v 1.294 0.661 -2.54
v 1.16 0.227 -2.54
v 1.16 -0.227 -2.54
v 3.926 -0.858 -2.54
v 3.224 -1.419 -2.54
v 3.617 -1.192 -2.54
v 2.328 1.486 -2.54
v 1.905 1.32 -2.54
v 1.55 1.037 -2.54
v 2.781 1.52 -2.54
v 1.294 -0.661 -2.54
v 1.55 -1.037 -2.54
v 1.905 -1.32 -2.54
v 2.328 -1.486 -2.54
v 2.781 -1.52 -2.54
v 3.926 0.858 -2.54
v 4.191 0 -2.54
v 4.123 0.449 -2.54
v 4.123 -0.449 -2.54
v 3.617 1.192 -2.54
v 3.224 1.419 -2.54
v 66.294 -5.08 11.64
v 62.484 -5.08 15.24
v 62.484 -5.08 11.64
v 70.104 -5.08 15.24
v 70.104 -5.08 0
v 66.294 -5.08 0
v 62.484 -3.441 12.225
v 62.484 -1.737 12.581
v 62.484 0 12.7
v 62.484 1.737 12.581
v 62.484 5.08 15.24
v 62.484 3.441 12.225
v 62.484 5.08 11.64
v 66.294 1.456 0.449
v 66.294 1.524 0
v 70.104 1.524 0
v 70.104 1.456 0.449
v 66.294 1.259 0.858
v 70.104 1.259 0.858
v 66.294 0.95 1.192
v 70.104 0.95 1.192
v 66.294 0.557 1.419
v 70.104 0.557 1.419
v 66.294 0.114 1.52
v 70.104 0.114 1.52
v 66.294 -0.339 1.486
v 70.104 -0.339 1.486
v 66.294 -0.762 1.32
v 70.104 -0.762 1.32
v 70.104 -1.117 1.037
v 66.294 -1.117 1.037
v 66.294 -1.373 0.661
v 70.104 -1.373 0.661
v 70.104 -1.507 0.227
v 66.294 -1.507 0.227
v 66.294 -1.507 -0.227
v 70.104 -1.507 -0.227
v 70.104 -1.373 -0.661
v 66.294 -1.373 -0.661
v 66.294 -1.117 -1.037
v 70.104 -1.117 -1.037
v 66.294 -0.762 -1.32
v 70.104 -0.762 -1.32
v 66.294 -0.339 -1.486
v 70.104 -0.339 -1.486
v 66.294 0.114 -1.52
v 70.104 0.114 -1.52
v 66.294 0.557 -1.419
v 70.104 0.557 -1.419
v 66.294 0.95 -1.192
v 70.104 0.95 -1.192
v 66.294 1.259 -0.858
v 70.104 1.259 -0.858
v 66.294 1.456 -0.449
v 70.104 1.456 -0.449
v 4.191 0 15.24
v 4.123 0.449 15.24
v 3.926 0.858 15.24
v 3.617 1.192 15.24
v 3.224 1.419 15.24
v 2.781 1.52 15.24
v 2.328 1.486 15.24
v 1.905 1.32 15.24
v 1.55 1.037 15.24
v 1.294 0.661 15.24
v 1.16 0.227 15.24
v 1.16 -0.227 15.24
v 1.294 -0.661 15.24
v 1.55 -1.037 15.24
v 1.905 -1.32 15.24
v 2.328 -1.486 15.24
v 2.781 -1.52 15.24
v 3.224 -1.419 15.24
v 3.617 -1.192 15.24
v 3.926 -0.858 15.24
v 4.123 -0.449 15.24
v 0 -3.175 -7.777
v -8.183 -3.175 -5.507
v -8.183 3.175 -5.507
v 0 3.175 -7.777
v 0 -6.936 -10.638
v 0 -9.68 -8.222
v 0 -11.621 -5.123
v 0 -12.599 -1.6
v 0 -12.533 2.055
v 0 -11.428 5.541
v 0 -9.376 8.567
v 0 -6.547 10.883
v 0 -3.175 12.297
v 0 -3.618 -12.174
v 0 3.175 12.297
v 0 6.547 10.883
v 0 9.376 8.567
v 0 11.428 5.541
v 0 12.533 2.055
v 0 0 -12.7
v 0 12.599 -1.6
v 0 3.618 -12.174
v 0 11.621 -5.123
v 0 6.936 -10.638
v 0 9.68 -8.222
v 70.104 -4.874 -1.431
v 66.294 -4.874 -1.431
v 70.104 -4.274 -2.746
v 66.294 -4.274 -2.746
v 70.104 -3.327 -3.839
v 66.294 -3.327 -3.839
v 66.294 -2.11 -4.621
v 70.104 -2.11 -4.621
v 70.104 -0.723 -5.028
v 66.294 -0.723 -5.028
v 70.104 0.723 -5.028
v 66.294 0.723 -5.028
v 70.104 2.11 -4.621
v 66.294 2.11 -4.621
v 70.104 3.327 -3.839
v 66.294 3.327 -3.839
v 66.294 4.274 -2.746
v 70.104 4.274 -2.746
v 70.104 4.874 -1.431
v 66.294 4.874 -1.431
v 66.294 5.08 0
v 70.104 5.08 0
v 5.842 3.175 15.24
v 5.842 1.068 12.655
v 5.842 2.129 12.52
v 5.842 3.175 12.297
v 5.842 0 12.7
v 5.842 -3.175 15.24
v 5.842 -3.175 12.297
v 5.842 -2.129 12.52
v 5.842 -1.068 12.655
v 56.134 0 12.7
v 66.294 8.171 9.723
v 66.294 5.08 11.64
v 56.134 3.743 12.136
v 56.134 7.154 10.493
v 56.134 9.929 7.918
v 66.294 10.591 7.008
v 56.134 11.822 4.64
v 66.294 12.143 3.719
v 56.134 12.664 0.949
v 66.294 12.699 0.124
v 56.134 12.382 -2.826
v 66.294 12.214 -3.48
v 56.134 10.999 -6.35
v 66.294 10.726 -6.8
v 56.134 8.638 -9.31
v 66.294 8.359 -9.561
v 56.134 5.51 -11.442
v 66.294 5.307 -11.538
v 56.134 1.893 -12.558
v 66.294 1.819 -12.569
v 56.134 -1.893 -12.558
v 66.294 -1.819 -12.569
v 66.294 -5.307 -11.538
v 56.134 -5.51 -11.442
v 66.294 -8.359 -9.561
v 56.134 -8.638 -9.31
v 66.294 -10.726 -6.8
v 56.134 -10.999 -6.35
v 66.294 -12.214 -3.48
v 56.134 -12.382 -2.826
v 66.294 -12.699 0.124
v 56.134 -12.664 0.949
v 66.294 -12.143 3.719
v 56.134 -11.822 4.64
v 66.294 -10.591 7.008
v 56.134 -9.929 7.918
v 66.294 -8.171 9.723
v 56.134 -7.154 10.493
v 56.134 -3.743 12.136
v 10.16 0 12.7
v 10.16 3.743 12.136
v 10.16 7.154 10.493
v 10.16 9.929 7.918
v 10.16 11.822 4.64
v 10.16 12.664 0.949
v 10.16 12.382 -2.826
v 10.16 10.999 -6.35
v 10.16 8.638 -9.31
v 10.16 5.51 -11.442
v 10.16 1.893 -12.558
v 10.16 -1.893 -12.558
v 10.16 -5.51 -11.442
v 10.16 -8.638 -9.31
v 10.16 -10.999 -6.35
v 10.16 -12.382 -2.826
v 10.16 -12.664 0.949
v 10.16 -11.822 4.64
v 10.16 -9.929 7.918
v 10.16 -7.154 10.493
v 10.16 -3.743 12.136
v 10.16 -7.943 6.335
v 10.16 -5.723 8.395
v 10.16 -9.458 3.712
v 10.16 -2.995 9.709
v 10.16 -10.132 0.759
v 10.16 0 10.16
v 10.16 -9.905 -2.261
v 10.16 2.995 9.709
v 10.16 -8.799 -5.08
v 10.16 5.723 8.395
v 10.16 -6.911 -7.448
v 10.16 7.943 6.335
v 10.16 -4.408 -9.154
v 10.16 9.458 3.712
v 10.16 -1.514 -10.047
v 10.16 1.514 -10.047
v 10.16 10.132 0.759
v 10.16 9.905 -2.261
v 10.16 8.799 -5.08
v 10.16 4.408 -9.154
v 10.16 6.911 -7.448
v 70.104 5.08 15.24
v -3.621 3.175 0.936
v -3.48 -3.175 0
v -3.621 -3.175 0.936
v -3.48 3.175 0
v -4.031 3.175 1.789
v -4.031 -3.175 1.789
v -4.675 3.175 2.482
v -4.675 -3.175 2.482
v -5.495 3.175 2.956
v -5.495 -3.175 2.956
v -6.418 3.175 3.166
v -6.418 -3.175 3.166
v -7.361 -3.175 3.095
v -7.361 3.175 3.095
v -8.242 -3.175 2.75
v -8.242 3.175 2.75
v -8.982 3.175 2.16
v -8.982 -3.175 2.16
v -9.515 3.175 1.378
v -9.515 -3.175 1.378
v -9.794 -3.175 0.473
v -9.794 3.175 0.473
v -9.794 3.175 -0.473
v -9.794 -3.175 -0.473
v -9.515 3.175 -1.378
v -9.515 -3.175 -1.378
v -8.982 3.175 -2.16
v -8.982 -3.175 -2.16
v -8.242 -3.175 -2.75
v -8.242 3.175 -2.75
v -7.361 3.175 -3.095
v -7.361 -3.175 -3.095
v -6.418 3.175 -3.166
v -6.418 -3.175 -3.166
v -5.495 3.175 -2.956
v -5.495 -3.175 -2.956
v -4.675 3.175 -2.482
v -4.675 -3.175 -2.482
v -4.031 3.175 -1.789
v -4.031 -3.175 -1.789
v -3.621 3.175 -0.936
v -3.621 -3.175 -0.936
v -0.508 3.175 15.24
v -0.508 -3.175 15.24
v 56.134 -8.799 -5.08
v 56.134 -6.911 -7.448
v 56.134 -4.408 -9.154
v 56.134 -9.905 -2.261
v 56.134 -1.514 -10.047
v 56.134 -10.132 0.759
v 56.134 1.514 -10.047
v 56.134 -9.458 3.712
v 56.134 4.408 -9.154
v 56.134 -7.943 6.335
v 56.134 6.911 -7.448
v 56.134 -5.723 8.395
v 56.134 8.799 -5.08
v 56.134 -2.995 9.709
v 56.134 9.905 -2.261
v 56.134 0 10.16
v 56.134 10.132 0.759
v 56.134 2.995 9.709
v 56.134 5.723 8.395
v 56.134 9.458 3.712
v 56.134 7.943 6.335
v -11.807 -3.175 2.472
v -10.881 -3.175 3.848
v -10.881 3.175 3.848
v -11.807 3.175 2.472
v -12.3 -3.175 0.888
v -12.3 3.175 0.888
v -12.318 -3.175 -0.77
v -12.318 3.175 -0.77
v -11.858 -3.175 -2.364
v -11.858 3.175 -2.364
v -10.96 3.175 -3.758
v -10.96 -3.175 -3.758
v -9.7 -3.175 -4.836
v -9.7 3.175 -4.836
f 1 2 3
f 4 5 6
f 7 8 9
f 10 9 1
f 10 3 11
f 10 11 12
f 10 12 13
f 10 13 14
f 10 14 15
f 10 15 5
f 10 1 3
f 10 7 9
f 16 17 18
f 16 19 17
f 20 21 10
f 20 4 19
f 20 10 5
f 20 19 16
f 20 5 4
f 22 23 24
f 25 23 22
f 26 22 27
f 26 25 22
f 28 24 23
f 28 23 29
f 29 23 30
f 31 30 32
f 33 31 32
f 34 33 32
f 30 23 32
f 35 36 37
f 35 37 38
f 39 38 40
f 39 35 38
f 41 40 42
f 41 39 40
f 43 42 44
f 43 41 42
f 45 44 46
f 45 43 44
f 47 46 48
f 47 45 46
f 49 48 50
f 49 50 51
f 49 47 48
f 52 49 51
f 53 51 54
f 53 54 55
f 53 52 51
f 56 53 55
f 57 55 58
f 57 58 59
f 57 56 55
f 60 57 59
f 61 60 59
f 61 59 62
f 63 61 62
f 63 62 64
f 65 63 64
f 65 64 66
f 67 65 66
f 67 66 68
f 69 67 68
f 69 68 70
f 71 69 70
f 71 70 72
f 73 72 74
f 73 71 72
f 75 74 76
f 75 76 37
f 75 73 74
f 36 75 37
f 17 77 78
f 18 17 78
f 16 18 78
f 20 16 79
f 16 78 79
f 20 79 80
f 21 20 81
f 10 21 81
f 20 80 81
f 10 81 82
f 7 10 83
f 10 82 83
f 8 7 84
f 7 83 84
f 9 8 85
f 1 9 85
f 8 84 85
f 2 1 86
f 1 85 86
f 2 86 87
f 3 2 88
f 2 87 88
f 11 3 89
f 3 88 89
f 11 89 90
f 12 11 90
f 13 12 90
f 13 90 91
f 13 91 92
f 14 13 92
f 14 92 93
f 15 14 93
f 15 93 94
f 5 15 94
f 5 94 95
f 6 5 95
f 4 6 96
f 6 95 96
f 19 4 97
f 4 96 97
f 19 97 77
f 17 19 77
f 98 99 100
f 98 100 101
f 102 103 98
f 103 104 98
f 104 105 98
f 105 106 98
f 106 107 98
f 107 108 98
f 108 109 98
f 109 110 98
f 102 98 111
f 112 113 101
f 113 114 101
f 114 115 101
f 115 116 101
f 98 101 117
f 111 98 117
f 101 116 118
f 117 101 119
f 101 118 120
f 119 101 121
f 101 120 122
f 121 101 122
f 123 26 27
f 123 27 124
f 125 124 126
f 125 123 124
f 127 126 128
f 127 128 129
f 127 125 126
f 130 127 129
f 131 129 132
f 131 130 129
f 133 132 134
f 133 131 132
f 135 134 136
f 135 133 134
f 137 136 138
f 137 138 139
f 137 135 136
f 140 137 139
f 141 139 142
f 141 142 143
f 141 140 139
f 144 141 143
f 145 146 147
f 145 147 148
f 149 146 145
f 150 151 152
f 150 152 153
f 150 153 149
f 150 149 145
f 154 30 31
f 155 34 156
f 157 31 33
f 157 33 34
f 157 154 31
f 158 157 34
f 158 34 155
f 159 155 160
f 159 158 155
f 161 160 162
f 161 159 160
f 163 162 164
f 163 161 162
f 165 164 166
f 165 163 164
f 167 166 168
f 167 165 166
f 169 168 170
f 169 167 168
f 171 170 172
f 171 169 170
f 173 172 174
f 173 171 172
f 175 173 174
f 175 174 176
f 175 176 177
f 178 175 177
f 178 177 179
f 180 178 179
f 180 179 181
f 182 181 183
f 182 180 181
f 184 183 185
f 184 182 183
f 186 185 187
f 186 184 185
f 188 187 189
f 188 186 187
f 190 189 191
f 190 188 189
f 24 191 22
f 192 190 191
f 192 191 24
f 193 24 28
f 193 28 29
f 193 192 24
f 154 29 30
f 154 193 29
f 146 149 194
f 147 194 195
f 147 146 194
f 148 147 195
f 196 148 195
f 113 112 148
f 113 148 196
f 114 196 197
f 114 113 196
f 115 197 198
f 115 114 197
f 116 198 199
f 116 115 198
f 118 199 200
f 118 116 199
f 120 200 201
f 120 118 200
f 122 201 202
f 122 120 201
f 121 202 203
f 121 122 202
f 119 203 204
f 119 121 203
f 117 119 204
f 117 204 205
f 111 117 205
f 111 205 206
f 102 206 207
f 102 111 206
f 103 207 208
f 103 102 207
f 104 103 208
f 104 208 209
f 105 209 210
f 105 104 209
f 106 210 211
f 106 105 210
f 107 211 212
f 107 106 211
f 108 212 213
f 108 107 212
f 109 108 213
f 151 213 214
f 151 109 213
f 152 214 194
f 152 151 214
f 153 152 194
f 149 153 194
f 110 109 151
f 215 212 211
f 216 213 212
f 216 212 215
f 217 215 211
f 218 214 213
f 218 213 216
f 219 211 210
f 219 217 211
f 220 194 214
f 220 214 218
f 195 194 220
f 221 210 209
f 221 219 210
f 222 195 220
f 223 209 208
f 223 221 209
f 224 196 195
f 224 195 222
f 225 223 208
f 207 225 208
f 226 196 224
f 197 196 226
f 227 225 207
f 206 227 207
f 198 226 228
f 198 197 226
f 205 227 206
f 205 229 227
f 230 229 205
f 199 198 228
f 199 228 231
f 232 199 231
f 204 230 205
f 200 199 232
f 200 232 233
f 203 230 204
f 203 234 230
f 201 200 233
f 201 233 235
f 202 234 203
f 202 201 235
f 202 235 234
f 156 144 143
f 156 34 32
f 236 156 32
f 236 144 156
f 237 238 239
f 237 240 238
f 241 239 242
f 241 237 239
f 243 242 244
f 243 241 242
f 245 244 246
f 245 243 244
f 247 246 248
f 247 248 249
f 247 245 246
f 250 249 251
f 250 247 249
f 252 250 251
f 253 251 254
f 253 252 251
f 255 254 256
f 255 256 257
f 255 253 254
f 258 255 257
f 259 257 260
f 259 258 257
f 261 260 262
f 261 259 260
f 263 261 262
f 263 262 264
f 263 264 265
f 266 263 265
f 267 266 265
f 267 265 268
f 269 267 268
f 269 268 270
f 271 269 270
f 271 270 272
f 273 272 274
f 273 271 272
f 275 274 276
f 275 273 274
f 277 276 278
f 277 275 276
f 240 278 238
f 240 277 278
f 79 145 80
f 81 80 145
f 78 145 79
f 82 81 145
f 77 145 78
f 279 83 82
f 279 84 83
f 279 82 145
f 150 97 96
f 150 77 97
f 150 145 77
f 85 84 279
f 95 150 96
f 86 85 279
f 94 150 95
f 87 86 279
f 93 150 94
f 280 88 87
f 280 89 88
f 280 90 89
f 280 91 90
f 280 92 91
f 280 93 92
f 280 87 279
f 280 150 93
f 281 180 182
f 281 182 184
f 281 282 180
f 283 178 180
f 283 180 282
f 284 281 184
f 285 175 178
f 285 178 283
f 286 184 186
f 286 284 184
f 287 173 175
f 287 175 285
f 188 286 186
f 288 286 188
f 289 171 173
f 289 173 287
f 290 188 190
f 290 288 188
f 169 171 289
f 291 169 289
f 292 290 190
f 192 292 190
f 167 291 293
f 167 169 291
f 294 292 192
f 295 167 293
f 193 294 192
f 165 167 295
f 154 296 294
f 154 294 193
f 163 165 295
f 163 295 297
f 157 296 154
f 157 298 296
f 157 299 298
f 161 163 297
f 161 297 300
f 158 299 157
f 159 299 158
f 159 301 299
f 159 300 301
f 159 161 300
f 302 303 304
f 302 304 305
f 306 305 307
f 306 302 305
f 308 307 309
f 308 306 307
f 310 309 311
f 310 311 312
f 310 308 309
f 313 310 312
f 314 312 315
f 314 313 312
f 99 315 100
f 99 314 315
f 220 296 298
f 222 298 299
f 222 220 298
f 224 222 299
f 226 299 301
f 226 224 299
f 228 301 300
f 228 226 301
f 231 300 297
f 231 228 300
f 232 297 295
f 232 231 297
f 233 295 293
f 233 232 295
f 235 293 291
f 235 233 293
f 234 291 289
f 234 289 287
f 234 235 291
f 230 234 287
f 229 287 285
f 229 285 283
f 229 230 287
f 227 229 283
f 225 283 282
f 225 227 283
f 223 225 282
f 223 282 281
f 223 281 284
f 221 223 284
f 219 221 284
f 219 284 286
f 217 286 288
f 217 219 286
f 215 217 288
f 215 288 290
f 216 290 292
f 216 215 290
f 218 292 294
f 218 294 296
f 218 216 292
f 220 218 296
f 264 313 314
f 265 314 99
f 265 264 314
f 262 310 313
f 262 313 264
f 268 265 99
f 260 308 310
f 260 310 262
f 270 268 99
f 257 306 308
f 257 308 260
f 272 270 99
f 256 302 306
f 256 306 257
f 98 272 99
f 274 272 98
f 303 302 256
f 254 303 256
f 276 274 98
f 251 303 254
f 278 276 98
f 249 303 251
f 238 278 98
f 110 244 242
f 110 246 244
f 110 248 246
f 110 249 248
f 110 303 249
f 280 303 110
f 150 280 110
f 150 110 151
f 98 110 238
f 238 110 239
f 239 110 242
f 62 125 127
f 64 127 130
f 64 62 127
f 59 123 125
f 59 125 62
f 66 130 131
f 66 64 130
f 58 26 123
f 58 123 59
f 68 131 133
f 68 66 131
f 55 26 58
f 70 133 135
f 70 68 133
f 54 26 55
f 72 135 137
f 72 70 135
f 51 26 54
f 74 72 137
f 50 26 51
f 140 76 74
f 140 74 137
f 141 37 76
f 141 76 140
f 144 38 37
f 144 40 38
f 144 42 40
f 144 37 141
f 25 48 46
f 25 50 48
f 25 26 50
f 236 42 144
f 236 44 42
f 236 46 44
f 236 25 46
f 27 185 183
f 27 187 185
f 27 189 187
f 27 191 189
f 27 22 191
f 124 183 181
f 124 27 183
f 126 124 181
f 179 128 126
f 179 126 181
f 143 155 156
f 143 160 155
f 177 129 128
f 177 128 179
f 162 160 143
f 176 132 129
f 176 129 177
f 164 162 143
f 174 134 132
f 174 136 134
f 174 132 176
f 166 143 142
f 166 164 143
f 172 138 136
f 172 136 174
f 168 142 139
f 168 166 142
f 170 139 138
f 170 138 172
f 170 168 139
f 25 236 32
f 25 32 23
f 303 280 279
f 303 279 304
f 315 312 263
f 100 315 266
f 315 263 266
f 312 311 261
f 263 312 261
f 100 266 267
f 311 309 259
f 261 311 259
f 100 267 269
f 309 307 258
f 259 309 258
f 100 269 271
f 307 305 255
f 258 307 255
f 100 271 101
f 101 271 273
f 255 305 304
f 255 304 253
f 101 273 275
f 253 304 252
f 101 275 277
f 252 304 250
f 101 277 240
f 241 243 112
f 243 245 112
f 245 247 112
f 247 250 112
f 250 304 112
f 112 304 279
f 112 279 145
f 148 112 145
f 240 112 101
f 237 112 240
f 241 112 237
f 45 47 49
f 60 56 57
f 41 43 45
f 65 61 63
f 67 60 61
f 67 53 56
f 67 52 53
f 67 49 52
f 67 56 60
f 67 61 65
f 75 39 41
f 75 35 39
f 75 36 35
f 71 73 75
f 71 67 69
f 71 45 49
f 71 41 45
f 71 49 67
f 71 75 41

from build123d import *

# Parameters (mm, degrees)
F0_R     = 3.175
F0_W     = 5.842
F0_H     = 12.7
F2_DEPTH = 3.175
F4_R     = 1.524
F5_DEPTH = 3.81
F7_R     = 1.524
F9_DEPTH = 17.78


# Not quite as in the source:
# - the program builds the solid bodies; features that only make, move or delete a surface that nothing else refers to are left out


with BuildPart() as f1:
    # F0 (on Front) → F1 (revolve)
    with BuildSketch(Plane.XZ):
        Polygon((5.842, 12.7), (5.842, 0), (66.294, 0), (66.294, 12.7), (56.134, 12.7), (56.134, 10.16), (10.16, 10.16), (10.16, 12.7), align=None)
    revolve(axis=Axis((33.147, 0, 0), (-1, 0, 0)))

    # F0 (on Front) → F2 (join, symmetric)
    with BuildSketch(Plane.XZ):
        with BuildLine():
            Line((5.842, 0), (0, 0))
            Line((0, 0), (-0.9398, 0))
            ThreePointArc((-0.9398, 0), (-3.1957909266, -4.5493385486), (-8.1826630726, -5.5069827884))
            Line((-8.1826630726, -5.5069827884), (5.842, -9.398))
            Line((5.842, -9.398), (5.842, 0))
        make_face()
        with BuildLine():
            ThreePointArc((-8.1826630726, -5.5069827884), (-3.1957909266, -4.5493385486), (-0.9398, 0))
            ThreePointArc((-0.9398, 0), (-4.5919612295, 5.3297205562), (-10.8806298187, 3.8475430269))
            ThreePointArc((-10.8806298187, 3.8475430269), (-12.1459778134, -1.5837270034), (-8.1826630726, -5.5069827884))
        make_face()
        with Locations((-6.6548, 0)):
            Circle(F0_R, mode=Mode.SUBTRACT)
        with BuildLine():
            Line((-0.9398, 0), (0, 0))
            Line((0, 0), (0, 12.7))
            Line((0, 12.7), (5.842, 12.7))
            Line((5.842, 12.7), (5.842, 15.24))
            Line((5.842, 15.24), (-0.508, 15.24))
            Line((-0.508, 15.24), (-10.8806298187, 3.8475430269))
            ThreePointArc((-10.8806298187, 3.8475430269), (-4.5919612295, 5.3297205562), (-0.9398, 0))
        make_face()
        with Locations((2.921, 6.35)):
            Rectangle(F0_W, F0_H)
    extrude(amount=F2_DEPTH, both=True)

    # F0 (on Front) → F3 (revolve)
    with BuildSketch(Plane.XZ):
        with Locations((2.921, 6.35)):
            Rectangle(F0_W, F0_H)
    revolve(axis=Axis((33.147, 0, 0), (-1, 0, 0)))

    # F4 (on face) → F5 (join, symmetric)
    with BuildSketch(Plane.YZ.offset(66.294)):
        with BuildLine():
            ThreePointArc((-5.08, 0), (0, -5.08), (5.08, 0))
            ThreePointArc((5.08, 0), (0, 5.08), (-5.08, 0))
        make_face()
        Circle(F4_R, mode=Mode.SUBTRACT)
        with BuildLine():
            ThreePointArc((-5.08, 0), (0, 5.08), (5.08, 0))
            Line((5.08, 0), (5.08, 11.6397422652))
            ThreePointArc((5.08, 11.6397422652), (0, 12.7), (-5.08, 11.6397422652))
            Line((-5.08, 11.6397422652), (-5.08, 0))
        make_face()
        with BuildLine():
            ThreePointArc((-5.08, 11.6397422652), (0, 12.7), (5.08, 11.6397422652))
            Line((5.08, 11.6397422652), (5.08, 15.24))
            Line((5.08, 15.24), (-5.08, 15.24))
            Line((-5.08, 15.24), (-5.08, 11.6397422652))
        make_face()
    extrude(amount=F5_DEPTH, both=True)

    # F7 (on face) → F9 (cut)
    with BuildSketch(Plane.XY.offset(15.24)):
        with Locations((2.667, 0)):
            Circle(F7_R)
    extrude(amount=-F9_DEPTH, mode=Mode.SUBTRACT)


solid = f1.part
